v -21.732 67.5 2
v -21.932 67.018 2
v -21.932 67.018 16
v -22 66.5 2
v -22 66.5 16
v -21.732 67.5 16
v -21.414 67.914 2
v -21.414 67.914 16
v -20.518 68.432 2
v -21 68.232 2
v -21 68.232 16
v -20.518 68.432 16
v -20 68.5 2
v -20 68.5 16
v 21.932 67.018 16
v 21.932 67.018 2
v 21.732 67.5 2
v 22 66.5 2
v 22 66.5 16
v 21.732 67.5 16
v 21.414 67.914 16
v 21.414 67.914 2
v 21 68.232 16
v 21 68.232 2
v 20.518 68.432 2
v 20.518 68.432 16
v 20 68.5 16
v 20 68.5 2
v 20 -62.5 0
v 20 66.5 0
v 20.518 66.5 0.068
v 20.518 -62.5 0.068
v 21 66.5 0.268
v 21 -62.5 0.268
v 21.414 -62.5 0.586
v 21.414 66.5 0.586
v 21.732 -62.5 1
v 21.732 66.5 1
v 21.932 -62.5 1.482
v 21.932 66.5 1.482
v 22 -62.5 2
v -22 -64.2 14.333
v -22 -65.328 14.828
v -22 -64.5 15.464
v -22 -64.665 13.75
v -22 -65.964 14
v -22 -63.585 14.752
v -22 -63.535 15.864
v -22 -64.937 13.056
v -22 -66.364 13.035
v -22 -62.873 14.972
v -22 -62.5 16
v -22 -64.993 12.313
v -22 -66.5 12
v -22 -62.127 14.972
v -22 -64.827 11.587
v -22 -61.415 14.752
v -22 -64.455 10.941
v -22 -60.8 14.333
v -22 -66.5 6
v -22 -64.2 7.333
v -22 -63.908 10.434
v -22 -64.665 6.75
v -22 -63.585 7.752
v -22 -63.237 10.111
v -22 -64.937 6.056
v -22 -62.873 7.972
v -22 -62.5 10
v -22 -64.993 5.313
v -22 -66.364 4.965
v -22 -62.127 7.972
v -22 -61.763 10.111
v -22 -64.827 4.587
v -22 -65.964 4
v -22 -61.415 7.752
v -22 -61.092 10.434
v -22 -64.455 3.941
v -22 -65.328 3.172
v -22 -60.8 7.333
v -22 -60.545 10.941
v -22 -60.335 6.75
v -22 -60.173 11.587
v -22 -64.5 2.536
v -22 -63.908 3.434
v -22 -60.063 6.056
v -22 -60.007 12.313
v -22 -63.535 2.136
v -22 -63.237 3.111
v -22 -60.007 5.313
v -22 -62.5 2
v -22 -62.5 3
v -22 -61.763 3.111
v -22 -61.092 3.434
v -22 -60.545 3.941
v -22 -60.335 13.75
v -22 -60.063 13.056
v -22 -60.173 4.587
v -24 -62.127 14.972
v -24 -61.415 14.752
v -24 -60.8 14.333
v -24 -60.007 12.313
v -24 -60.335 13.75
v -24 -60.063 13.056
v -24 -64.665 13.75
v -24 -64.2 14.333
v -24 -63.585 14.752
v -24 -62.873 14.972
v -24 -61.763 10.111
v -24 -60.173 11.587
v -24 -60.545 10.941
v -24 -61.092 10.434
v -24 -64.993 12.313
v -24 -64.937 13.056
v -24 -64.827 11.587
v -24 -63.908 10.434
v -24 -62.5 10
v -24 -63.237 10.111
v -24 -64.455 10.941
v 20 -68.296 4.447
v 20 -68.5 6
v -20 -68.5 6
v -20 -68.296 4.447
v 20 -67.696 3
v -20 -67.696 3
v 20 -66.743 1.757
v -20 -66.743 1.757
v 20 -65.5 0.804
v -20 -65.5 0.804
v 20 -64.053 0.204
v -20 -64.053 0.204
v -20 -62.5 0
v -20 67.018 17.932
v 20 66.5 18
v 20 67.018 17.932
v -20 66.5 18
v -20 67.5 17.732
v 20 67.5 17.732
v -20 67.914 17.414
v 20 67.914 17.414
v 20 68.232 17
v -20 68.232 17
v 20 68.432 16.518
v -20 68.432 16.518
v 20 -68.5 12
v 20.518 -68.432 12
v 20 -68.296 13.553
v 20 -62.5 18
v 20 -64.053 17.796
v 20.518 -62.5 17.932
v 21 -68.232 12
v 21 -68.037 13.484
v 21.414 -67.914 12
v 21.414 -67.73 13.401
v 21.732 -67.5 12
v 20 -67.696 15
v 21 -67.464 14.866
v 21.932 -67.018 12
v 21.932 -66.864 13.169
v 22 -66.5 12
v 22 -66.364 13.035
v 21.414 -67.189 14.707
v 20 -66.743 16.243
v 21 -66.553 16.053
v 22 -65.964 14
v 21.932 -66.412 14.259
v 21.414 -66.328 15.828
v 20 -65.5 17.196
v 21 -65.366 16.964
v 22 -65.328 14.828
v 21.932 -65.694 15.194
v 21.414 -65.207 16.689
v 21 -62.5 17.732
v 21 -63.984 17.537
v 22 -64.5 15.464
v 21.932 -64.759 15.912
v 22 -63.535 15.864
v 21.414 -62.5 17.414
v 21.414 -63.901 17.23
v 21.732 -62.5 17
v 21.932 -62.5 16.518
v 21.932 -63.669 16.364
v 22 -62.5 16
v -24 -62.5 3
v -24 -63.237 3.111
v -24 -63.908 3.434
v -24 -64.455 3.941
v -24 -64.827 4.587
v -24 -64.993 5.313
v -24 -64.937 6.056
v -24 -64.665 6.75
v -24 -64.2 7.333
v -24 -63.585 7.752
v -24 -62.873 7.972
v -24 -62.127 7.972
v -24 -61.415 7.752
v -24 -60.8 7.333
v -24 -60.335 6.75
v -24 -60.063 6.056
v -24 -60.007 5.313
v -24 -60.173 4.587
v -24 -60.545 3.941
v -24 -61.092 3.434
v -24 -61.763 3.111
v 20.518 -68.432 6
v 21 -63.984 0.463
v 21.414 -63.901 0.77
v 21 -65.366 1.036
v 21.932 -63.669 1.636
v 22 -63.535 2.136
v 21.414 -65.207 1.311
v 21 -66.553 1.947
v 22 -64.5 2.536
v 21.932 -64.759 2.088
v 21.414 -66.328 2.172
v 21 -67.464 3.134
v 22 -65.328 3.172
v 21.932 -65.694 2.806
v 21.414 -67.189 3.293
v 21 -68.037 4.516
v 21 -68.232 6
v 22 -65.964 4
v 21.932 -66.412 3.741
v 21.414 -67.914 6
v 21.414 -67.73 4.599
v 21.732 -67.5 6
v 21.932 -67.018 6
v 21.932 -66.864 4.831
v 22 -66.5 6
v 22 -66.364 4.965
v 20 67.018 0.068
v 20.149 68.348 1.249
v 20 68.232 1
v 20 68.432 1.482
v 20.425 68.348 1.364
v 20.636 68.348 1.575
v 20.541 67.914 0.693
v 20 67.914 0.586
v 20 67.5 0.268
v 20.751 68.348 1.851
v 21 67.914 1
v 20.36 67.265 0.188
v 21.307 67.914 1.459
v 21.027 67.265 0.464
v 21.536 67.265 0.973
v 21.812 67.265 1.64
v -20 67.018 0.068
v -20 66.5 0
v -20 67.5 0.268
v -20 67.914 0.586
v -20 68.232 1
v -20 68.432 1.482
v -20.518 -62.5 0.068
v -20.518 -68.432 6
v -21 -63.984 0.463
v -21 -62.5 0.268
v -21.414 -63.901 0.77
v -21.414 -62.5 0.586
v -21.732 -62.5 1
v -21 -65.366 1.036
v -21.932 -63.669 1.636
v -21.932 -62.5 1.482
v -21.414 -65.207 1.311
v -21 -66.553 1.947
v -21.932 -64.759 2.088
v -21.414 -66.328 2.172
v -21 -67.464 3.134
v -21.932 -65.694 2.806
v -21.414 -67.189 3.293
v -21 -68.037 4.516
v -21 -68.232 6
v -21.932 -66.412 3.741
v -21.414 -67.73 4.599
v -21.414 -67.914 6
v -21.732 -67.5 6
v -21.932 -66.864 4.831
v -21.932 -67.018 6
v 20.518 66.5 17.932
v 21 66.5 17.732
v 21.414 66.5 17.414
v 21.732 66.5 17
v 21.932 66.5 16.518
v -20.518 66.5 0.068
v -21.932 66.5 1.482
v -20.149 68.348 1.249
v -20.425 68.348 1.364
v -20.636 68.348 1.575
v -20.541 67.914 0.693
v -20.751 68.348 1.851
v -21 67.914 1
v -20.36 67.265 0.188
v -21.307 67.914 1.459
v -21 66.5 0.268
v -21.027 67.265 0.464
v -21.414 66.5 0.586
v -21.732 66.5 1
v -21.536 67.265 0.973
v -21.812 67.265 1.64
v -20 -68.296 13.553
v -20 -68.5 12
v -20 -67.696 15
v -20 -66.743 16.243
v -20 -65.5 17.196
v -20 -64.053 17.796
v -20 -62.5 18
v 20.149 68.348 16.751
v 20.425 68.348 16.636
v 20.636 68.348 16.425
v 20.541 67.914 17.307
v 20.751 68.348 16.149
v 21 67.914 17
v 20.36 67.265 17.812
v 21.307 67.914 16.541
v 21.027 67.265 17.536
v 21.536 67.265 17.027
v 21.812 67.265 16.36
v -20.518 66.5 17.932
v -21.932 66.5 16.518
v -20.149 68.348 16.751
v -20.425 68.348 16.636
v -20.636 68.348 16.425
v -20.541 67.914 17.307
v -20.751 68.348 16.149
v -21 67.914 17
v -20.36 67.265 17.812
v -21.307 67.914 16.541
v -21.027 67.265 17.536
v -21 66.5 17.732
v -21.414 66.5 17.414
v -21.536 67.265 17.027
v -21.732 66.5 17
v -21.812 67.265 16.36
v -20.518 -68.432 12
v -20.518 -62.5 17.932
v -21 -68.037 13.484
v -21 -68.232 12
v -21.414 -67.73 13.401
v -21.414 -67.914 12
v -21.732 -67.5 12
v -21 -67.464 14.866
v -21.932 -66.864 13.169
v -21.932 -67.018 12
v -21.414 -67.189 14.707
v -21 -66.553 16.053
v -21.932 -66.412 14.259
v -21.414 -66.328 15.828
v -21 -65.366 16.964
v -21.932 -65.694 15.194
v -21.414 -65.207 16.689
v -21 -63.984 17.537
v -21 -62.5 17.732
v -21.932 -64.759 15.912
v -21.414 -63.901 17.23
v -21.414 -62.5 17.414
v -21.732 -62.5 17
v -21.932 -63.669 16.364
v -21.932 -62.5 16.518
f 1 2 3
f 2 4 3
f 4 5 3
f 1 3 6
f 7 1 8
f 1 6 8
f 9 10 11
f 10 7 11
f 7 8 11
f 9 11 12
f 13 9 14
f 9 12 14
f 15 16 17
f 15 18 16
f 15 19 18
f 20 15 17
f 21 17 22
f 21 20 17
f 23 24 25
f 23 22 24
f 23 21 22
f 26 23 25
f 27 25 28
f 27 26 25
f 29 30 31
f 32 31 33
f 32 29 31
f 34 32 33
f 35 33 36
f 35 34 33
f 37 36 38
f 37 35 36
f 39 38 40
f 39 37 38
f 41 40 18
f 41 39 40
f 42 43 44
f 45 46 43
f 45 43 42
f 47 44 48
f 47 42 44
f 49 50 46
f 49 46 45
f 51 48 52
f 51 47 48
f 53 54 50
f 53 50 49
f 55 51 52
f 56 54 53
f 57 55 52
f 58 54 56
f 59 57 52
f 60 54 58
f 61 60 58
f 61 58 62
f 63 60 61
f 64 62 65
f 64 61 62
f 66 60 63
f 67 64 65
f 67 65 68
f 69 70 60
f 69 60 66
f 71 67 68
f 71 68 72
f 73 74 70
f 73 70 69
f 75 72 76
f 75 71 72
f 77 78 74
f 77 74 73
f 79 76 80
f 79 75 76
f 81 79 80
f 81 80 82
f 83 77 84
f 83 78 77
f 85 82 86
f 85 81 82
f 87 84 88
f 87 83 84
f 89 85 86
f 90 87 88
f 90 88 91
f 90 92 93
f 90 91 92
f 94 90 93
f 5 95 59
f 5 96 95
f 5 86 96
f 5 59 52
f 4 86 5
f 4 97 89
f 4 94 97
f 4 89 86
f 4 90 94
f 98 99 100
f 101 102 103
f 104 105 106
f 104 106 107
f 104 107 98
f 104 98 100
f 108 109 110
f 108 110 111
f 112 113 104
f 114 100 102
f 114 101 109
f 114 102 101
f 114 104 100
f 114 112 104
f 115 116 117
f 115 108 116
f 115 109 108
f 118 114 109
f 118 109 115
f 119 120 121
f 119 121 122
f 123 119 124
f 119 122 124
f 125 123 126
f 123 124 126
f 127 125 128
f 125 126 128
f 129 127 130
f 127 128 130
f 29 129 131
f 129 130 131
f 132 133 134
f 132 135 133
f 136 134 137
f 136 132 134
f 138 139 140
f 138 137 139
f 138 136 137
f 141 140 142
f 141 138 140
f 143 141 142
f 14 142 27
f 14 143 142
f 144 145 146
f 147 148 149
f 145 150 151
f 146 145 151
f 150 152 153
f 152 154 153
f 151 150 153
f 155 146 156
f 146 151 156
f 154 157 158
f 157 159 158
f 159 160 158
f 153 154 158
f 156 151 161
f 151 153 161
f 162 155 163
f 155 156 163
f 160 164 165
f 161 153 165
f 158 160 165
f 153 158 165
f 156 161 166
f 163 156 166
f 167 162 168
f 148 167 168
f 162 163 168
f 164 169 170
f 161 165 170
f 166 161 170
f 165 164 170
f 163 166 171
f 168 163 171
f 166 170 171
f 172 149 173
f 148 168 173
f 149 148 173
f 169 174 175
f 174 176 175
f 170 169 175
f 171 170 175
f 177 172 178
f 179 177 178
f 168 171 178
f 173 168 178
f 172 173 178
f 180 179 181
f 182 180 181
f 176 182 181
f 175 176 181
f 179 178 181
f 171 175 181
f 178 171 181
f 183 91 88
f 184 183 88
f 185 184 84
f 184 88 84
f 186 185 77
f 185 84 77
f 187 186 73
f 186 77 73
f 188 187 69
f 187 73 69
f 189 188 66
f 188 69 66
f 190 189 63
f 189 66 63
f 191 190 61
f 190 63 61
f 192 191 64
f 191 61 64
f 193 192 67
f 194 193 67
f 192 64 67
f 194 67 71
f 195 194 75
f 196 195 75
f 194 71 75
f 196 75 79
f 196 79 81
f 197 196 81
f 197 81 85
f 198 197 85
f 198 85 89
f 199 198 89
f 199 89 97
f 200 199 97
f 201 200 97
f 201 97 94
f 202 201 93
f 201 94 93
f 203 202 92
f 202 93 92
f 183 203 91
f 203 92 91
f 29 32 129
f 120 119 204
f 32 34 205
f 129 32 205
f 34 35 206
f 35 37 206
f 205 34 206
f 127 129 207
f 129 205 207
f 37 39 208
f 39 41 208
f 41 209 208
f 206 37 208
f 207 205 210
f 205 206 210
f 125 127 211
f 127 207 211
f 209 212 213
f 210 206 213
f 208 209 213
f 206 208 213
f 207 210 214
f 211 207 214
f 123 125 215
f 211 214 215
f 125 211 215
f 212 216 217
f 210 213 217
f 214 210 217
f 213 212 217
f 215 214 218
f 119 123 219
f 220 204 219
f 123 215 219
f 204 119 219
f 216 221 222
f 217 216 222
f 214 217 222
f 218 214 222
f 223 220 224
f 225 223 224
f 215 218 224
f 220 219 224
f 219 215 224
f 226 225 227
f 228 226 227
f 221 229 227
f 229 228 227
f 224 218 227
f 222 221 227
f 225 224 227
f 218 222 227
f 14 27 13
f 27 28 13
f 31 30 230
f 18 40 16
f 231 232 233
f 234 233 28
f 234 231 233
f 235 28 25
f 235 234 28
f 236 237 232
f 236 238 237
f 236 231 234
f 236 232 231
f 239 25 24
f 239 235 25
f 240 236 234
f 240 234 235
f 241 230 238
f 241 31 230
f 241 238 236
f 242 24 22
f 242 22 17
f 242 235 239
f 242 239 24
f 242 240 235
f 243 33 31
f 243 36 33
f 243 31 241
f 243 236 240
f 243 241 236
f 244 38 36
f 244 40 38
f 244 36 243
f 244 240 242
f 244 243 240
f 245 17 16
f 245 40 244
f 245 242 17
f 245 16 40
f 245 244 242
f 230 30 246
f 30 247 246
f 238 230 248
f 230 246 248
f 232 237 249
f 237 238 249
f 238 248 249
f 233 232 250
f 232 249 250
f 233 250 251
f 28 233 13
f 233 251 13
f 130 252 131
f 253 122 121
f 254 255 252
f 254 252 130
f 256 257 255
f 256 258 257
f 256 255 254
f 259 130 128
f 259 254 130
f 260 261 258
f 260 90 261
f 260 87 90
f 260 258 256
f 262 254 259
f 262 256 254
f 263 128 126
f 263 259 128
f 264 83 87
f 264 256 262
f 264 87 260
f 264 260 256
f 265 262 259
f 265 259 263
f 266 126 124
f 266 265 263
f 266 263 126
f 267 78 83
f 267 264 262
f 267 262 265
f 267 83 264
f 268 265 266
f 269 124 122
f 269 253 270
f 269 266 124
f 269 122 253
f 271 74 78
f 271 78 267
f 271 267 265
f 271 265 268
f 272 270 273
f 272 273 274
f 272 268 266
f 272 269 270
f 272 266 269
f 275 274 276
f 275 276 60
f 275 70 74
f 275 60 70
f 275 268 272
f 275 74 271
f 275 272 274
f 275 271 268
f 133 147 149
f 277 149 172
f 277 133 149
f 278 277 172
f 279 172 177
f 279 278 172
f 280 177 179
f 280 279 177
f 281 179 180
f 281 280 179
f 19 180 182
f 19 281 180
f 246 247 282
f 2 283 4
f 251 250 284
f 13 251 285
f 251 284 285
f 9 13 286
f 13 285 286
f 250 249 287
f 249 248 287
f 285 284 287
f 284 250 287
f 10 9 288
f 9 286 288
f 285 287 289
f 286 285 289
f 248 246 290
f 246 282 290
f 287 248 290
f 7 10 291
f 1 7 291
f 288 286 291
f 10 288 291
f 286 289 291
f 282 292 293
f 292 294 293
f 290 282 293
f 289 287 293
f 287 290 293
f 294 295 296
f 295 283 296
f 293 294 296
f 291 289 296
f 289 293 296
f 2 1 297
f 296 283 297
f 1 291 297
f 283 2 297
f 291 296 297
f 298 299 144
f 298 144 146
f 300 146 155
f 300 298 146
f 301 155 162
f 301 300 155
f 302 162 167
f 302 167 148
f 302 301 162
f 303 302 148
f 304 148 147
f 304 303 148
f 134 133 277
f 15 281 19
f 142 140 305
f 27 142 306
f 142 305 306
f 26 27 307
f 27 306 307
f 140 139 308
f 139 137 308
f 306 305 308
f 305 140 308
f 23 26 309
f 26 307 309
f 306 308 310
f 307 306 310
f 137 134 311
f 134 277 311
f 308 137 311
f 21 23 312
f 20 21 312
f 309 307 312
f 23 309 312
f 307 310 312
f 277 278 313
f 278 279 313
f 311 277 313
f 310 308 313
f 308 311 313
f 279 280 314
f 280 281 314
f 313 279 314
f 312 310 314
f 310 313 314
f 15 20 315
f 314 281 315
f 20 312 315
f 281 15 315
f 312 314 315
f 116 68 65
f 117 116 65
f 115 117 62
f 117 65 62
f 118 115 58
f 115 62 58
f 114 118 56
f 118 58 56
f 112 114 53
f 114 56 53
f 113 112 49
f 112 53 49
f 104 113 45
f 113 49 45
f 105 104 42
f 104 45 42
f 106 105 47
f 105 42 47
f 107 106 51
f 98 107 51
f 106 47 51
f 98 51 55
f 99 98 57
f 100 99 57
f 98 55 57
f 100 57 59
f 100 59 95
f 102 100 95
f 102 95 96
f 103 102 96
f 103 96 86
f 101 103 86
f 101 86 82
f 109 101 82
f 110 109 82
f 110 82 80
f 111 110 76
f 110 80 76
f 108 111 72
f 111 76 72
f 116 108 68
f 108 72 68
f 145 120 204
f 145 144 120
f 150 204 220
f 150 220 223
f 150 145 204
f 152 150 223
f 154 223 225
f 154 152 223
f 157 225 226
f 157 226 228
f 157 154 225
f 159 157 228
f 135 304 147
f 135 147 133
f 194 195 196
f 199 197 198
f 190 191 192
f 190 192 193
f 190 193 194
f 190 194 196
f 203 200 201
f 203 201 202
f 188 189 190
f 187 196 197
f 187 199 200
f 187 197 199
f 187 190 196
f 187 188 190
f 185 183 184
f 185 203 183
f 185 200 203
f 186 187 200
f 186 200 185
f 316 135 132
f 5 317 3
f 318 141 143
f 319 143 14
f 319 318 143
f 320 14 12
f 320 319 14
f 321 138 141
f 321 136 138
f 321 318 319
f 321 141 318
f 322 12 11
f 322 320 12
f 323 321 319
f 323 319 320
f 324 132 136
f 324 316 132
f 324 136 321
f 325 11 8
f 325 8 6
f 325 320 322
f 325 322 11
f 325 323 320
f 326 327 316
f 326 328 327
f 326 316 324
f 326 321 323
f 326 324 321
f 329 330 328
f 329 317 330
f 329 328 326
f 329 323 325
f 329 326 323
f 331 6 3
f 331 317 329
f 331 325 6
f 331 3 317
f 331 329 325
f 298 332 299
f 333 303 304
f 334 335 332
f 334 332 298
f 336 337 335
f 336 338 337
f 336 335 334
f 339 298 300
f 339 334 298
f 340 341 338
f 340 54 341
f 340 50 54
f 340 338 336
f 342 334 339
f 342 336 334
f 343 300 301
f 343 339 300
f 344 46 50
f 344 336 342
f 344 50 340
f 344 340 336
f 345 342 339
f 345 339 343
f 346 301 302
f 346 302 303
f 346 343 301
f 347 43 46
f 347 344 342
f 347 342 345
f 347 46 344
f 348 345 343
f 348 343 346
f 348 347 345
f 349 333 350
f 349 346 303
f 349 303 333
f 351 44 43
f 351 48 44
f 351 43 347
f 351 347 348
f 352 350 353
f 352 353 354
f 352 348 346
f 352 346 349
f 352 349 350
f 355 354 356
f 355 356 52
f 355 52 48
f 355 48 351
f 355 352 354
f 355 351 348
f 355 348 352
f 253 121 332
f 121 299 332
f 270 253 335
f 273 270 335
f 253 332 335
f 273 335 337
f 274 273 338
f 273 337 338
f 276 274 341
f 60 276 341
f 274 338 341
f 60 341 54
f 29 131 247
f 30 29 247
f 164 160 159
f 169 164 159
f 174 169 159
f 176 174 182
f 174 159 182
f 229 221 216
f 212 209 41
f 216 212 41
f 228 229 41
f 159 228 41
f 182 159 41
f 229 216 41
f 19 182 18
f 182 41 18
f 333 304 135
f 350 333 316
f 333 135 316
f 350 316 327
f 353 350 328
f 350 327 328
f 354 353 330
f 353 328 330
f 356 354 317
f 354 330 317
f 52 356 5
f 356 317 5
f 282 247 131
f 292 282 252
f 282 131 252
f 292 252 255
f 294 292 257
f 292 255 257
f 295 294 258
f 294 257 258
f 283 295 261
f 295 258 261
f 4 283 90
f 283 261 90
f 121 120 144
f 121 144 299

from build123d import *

# Parameters (mm, degrees)
SKETCH1_W           = 137
SKETCH1_H           = 44
BOSS_EXTRUDE1_DEPTH = 18
FILLET1_R           = 6
FILLET2_R           = 2
SKETCH2_R           = 2.5
BOSS_EXTRUDE2_DEPTH = 2


with BuildPart() as part:
    # Sketch1 → Boss-Extrude1 (new body)
    with BuildSketch(Plane(origin=(0, 0, 0), x_dir=(0, 1, 0), z_dir=(0, 0, 1))):
        Rectangle(SKETCH1_W, SKETCH1_H)
    extrude(amount=BOSS_EXTRUDE1_DEPTH)

    # Fillet1
    fillet1_edges = [part.edges().sort_by_distance(p)[0] for p in [
        (0, -68.5, 18),
        (0, -68.5, 0),
    ]]
    fillet(fillet1_edges, radius=FILLET1_R)

    # Fillet2
    fillet2_edges = [part.edges().sort_by_distance(p)[0] for p in [
        (22, -68.5, 9),
        (-22, -68.5, 9),
        (22, 3, 0),
        (22, 3, 18),
        (22, -66.742640687, 16.242640687),
        (22, -66.742640687, 1.757359313),
        (-22, -66.742640687, 16.242640687),
        (-22, -66.742640687, 1.757359313),
        (0, 68.5, 18),
        (-22, 3, 0),
        (0, 68.5, 0),
        (22, 68.5, 9),
        (-22, 68.5, 9),
        (-22, 3, 18),
    ]]
    fillet(fillet2_edges, radius=FILLET2_R)

    # Sketch2 → Boss-Extrude2 (add)
    with BuildSketch(Plane(origin=(-22, 0, 0), x_dir=(0, -1, 0), z_dir=(-1, 0, 0))):
        with Locations(Location((62.5, 12.5, 0), (0, 0, 270))):
            Circle(SKETCH2_R)
        with Locations(Location((62.5, 5.5, 0), (0, 0, 270))):
            Circle(SKETCH2_R)
    extrude(amount=BOSS_EXTRUDE2_DEPTH)


solid = part.part
